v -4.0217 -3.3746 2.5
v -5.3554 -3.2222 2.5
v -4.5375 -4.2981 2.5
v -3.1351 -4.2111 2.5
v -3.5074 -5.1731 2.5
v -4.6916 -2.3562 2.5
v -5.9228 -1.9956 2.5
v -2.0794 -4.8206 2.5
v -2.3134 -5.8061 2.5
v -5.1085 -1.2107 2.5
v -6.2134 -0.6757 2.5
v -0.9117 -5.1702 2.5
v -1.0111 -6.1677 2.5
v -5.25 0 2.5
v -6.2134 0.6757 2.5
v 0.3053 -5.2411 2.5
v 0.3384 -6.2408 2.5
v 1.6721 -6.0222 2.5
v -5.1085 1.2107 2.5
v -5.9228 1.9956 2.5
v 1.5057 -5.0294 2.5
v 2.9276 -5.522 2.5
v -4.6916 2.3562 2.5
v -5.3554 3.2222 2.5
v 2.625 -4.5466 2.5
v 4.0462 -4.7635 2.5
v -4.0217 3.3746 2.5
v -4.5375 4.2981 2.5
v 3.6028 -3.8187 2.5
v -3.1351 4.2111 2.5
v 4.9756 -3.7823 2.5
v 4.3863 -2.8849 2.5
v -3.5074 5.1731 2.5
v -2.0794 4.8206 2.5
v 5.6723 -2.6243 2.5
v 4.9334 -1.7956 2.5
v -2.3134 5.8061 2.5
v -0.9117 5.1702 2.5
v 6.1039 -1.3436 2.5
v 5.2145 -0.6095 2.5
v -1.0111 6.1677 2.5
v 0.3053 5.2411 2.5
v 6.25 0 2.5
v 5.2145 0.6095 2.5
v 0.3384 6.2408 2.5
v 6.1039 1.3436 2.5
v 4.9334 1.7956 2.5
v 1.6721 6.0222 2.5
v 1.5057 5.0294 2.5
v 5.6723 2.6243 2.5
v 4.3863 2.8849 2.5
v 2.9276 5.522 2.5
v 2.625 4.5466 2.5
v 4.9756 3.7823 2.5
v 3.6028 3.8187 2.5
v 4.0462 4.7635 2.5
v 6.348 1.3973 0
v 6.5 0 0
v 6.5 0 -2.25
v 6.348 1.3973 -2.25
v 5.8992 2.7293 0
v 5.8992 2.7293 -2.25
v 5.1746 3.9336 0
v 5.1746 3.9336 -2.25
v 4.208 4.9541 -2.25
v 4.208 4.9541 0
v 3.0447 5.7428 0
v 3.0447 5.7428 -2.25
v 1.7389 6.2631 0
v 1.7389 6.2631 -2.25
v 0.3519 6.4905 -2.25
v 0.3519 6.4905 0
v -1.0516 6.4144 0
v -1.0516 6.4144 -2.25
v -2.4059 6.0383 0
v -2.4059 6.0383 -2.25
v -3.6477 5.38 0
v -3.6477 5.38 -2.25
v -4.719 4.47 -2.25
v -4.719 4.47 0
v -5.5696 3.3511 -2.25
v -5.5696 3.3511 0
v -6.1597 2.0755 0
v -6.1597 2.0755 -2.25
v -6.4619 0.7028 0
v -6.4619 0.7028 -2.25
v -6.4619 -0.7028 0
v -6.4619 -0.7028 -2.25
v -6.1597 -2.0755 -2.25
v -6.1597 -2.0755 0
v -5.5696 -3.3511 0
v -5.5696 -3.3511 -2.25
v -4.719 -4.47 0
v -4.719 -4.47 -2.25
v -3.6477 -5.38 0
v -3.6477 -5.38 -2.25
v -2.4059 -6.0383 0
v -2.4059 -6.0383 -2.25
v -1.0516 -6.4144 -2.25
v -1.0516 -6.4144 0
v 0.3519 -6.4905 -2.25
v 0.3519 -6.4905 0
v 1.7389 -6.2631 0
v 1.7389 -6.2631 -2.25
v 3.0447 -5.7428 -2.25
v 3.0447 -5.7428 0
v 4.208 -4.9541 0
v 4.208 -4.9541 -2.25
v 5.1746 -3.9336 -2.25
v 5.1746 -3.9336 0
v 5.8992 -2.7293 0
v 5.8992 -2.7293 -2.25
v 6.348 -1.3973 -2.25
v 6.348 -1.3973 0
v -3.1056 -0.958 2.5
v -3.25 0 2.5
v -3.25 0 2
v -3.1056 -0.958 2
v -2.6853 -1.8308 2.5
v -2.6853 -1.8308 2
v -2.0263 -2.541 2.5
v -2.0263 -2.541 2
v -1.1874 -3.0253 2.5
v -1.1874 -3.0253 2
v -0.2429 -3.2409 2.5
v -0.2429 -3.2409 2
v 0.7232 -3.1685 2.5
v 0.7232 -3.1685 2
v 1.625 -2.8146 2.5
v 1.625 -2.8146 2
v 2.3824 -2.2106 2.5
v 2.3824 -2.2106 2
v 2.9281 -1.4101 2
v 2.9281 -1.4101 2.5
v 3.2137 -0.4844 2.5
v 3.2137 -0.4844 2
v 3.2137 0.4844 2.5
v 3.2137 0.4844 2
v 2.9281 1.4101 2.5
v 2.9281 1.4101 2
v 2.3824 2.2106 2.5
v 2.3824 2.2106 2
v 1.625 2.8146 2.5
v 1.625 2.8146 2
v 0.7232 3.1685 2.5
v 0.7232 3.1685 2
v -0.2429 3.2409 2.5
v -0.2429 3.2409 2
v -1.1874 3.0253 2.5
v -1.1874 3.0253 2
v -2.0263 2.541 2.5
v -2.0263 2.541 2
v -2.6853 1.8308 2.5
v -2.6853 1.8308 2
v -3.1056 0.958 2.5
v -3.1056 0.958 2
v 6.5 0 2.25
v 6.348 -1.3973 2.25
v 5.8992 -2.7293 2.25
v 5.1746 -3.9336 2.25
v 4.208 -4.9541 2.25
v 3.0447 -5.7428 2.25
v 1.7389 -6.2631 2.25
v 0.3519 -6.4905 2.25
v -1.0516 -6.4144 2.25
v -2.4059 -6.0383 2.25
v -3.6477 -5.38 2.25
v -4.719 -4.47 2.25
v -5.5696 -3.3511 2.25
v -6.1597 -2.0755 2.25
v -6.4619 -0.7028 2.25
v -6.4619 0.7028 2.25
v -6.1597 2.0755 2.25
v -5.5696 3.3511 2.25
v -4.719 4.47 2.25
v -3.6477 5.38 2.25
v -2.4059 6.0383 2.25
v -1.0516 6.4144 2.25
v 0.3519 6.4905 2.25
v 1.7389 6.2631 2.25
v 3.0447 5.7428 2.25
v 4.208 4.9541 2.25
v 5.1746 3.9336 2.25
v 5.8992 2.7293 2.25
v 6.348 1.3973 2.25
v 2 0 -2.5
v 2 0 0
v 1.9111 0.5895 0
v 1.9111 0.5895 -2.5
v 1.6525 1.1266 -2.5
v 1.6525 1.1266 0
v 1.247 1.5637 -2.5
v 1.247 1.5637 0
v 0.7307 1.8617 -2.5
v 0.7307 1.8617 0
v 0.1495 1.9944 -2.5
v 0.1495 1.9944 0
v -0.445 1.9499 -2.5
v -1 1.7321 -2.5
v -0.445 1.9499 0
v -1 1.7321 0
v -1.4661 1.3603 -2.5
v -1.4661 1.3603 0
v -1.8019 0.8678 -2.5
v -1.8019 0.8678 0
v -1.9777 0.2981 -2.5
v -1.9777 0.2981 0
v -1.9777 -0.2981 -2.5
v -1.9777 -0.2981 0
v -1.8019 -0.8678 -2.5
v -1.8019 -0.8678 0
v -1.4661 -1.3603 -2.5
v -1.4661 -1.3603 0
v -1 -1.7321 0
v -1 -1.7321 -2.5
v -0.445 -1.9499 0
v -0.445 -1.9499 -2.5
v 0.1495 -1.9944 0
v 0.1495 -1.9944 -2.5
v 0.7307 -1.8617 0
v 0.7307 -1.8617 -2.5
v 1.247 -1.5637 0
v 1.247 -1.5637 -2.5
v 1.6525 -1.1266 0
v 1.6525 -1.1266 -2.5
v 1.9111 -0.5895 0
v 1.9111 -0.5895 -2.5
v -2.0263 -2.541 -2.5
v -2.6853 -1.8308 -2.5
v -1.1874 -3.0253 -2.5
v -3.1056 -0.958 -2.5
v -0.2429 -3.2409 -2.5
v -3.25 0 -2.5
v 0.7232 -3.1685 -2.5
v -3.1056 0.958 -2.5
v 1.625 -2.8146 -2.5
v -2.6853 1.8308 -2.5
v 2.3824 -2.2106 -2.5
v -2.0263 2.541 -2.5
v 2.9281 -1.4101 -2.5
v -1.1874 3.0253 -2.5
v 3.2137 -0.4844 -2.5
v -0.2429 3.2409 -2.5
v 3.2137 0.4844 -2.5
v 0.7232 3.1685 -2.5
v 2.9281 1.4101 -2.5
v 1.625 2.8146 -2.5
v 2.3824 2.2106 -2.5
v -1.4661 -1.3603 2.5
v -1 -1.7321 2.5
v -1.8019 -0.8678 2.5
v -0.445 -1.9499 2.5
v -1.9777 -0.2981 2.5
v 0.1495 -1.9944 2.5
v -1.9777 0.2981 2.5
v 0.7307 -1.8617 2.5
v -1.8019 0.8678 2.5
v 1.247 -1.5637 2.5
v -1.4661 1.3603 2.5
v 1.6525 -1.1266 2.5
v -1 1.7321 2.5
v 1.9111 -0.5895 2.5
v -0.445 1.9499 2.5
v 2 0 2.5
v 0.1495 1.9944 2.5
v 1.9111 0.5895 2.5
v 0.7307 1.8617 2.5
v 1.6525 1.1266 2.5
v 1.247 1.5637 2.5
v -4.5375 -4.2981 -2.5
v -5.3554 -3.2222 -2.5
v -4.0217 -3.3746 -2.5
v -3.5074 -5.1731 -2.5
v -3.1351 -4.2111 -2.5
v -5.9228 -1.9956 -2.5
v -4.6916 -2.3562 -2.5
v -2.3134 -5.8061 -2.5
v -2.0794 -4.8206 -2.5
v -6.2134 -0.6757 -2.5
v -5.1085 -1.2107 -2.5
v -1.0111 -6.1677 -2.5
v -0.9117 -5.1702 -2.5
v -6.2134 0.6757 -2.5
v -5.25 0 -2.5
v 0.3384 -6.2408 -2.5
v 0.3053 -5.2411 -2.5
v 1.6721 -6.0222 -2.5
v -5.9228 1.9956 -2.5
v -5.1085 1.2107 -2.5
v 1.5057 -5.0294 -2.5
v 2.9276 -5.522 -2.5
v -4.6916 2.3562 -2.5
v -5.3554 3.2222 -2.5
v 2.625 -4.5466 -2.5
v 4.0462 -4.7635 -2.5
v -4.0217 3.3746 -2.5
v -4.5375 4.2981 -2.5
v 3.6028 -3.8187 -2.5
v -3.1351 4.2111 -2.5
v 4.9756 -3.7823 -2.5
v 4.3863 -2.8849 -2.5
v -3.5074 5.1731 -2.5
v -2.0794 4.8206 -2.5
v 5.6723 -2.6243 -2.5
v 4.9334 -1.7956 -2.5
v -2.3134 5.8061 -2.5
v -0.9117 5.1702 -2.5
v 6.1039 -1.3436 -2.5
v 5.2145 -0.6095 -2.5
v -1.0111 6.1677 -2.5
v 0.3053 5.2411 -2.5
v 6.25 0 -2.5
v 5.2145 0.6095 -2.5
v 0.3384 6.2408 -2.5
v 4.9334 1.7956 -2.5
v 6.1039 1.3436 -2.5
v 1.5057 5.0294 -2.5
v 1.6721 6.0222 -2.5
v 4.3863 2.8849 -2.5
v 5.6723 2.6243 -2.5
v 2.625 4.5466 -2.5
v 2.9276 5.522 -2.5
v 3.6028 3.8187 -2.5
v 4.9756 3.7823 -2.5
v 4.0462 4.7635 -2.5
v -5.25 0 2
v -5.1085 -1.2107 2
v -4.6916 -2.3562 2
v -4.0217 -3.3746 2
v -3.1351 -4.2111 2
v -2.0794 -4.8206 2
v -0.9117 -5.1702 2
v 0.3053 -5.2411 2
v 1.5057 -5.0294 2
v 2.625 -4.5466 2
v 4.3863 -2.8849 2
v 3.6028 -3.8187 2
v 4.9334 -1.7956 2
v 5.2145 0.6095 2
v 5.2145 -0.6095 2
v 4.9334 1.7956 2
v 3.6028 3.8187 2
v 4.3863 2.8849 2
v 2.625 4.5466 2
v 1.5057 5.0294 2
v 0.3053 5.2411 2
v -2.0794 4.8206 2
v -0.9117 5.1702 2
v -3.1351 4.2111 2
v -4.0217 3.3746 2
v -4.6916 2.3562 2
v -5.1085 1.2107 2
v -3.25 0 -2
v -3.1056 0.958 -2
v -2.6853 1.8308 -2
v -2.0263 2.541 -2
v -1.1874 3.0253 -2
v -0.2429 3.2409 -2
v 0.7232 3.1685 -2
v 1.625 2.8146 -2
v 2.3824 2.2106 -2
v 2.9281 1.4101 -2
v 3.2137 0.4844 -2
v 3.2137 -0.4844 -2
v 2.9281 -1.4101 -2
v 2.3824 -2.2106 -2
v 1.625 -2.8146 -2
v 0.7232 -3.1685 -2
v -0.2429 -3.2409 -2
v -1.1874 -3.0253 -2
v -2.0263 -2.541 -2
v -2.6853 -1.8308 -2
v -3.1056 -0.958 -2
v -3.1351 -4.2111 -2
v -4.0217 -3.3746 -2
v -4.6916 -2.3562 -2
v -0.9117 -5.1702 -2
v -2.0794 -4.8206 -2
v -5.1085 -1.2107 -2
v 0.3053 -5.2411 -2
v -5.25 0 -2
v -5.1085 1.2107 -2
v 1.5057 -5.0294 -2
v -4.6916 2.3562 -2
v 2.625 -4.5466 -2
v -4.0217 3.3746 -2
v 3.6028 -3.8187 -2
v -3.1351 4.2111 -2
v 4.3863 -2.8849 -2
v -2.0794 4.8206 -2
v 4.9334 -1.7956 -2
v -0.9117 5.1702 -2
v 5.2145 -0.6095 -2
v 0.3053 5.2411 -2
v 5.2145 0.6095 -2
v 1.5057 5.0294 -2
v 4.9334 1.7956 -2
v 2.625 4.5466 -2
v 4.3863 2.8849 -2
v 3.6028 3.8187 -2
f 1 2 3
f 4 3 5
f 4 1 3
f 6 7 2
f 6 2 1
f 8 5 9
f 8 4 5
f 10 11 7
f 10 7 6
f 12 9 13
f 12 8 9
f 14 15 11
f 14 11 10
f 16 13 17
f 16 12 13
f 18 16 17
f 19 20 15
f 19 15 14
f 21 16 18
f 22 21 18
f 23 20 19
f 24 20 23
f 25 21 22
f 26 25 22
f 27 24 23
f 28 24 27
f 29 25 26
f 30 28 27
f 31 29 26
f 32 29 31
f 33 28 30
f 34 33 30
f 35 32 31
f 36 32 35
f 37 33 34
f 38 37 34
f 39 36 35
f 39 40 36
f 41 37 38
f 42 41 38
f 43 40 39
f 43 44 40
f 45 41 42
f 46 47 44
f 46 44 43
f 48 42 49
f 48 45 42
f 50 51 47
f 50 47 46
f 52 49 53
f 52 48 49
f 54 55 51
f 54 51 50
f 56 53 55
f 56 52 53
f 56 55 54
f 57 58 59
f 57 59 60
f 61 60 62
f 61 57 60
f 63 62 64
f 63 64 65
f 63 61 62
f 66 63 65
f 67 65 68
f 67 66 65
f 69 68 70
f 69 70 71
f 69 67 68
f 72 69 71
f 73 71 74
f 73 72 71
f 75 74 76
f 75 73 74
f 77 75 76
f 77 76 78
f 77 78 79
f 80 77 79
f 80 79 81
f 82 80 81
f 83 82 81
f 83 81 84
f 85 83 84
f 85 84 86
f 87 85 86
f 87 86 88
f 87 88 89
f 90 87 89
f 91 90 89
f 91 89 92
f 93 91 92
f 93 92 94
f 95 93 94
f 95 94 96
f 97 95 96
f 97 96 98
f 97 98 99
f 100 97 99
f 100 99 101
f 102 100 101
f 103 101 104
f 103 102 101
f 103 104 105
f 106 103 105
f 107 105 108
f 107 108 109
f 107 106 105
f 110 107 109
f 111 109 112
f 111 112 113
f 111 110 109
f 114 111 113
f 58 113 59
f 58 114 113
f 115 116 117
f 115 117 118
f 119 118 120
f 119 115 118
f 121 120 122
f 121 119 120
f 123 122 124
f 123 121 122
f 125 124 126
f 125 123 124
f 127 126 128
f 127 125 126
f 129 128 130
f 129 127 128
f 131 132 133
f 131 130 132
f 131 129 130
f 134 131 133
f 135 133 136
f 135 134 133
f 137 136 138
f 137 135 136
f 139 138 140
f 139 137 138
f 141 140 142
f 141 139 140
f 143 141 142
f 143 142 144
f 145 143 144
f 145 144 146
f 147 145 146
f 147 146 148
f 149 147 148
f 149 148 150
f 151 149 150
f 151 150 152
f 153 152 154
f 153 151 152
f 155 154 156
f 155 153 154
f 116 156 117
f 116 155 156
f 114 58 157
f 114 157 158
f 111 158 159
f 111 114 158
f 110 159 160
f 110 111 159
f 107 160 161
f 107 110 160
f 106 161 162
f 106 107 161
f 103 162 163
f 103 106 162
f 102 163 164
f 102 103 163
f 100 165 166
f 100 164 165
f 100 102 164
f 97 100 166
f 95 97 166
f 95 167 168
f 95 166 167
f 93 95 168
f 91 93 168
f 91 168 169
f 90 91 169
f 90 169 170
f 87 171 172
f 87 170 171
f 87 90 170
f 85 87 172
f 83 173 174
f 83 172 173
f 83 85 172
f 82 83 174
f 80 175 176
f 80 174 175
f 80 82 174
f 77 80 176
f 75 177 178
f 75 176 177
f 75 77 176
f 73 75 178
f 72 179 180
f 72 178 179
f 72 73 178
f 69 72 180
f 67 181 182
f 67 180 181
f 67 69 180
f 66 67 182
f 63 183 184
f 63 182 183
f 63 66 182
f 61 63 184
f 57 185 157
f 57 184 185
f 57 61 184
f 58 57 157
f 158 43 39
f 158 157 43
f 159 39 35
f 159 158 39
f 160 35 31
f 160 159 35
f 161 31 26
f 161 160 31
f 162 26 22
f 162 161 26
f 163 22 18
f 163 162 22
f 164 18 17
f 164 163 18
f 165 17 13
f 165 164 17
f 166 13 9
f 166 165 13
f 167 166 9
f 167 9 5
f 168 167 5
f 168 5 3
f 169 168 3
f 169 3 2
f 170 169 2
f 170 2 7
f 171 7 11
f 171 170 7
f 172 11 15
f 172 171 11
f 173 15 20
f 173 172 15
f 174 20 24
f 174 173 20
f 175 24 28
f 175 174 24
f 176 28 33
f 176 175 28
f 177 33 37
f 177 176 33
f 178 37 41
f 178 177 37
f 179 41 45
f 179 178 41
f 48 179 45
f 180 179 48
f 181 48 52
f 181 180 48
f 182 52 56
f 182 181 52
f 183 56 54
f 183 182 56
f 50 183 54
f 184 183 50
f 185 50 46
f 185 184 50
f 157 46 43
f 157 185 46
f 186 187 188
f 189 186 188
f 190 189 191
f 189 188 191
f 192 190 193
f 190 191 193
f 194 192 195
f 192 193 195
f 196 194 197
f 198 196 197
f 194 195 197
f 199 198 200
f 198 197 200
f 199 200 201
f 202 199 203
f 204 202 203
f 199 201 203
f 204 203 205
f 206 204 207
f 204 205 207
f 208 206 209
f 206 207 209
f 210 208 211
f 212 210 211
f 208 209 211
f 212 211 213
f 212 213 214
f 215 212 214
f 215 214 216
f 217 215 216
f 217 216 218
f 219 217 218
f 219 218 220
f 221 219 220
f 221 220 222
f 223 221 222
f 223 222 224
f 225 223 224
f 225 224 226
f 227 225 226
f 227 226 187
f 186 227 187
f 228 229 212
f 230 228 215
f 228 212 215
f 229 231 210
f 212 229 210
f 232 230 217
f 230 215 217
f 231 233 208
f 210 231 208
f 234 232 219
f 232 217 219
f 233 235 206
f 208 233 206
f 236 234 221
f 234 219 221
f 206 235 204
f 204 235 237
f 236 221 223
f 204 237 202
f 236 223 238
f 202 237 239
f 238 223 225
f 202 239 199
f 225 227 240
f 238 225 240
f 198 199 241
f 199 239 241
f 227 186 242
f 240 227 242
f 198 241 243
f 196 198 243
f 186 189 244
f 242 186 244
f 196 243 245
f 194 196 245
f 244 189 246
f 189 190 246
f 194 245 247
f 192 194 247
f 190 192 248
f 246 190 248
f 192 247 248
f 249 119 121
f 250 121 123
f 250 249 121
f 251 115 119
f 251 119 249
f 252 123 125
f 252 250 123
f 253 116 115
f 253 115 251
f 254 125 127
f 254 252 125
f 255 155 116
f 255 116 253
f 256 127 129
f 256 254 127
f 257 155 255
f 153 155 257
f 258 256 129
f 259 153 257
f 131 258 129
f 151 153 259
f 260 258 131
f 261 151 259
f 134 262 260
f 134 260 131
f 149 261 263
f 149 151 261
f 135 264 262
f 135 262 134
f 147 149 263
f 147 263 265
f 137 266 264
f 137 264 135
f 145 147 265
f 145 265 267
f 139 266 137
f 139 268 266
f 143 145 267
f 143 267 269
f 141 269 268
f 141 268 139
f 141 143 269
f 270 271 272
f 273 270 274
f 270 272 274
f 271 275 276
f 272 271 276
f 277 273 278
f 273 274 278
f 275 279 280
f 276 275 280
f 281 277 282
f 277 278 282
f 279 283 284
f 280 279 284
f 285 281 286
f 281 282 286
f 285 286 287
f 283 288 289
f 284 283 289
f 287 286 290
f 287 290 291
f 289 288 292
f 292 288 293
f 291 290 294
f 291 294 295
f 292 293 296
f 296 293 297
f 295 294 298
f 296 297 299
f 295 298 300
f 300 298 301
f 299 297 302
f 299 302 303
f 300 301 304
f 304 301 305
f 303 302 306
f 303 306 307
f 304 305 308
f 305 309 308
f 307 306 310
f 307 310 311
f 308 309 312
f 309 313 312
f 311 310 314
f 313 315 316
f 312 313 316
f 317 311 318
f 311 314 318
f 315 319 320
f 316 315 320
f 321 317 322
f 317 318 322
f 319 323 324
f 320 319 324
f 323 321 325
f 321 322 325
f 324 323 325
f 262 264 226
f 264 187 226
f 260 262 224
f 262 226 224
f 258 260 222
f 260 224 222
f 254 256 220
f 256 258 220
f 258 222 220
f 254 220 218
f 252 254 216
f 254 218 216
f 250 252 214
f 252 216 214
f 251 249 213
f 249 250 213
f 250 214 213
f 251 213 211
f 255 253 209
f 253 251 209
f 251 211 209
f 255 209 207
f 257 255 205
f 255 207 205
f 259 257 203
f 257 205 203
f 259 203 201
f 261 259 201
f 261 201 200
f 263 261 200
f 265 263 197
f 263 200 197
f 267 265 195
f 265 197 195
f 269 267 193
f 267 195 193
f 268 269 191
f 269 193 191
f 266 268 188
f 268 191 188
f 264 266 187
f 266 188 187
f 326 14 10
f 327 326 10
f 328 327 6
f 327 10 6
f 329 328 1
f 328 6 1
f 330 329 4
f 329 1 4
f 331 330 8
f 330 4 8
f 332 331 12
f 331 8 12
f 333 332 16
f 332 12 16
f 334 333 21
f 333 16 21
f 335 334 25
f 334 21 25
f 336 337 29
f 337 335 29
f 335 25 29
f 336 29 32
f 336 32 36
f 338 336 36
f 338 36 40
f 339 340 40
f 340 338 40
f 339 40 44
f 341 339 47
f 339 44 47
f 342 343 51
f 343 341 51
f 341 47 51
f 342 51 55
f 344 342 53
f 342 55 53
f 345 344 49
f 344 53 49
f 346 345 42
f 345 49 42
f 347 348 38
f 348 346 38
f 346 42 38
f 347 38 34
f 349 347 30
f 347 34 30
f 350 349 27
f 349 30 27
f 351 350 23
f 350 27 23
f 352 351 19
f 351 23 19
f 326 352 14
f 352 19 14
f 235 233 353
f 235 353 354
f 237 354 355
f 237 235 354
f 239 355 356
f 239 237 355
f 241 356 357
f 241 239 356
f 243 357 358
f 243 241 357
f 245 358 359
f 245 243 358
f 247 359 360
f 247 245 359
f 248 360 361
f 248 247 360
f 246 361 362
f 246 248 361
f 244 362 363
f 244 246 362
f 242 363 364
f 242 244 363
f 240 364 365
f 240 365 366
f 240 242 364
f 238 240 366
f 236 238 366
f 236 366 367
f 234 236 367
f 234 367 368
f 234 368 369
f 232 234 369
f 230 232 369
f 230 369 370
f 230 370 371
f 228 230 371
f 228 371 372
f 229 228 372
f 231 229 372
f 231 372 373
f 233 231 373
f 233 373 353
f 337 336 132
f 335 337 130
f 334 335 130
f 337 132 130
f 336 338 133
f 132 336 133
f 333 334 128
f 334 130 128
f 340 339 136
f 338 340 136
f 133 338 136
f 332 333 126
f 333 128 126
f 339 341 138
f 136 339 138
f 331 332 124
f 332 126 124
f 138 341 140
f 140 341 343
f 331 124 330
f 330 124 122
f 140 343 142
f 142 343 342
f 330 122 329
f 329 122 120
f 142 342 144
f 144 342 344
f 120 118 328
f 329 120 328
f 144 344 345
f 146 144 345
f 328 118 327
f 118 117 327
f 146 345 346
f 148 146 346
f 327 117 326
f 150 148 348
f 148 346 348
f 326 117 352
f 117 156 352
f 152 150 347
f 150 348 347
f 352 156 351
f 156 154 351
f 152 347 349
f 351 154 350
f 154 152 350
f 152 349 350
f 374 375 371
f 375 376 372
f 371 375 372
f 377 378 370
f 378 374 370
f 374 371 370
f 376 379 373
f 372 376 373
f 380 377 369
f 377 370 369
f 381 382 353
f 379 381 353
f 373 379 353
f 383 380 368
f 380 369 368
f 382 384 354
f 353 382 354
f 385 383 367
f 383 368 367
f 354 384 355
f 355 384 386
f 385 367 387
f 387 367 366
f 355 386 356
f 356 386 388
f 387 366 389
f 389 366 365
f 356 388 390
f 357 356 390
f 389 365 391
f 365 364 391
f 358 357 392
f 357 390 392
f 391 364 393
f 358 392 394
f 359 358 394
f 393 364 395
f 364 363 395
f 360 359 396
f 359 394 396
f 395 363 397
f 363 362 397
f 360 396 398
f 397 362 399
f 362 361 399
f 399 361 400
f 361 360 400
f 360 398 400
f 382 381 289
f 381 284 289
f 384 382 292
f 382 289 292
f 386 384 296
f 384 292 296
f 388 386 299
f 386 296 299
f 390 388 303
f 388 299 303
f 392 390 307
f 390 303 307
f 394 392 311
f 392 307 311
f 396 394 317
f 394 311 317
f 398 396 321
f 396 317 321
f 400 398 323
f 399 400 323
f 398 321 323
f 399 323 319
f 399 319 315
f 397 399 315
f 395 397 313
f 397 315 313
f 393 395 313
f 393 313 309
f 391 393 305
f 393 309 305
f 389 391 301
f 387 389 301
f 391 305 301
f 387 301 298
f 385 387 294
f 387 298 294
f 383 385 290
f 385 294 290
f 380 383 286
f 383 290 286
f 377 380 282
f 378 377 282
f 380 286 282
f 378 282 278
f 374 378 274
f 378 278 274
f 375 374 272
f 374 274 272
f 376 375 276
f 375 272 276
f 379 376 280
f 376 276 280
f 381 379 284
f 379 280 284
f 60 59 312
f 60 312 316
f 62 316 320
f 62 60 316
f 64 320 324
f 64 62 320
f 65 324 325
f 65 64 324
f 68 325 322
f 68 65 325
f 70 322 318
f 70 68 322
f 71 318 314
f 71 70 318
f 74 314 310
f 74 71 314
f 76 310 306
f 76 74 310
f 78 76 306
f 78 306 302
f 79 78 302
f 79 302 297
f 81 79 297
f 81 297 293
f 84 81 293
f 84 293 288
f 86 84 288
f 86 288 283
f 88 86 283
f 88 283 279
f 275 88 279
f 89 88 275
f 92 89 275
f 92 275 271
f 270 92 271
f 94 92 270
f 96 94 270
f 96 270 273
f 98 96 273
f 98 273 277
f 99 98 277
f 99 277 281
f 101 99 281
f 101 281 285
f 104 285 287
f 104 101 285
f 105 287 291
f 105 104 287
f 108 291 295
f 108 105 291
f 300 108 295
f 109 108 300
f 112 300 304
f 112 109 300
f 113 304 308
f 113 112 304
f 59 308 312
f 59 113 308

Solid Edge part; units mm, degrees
sketch "Sketch1" plane through (0, 0, 0) normal (0, 0, 1) x (1, 0, 0)
  circle A0 centre (0, 0) radius 2
  circle A1 centre (0, 0) radius 6.5
extrude "Protrusion1" add sketch "Sketch1" along normal mid plane 5
chamfer "Chamfer_1" distance 0.25 angle 45 2 edges at (-6.5, 0, 2.5) (-6.5, 0, -2.5)
sketch "Sketch2" plane through (0, 0, 0) normal (0, -1, 0) x (1, 0, 0)
  line L0 (-3.25, 2) -> (-3.25, 2.5)
  line L1 (-5.25, 2) -> (-3.25, 2)
  line L2 (-5.25, 2) -> (-5.25, 2.5)
  dimension "D1" = 2
revolve "RevolvedCutout1" cut sketch "Sketch2" angle 360 about axis through (0, 0, 54) along (0, 0, -1) material side at (-3.3, 0, 2.25)
mirror "Mirror1" about plane through (0, 0, 0) normal (0, 0, 1) of "RevolvedCutout1"
